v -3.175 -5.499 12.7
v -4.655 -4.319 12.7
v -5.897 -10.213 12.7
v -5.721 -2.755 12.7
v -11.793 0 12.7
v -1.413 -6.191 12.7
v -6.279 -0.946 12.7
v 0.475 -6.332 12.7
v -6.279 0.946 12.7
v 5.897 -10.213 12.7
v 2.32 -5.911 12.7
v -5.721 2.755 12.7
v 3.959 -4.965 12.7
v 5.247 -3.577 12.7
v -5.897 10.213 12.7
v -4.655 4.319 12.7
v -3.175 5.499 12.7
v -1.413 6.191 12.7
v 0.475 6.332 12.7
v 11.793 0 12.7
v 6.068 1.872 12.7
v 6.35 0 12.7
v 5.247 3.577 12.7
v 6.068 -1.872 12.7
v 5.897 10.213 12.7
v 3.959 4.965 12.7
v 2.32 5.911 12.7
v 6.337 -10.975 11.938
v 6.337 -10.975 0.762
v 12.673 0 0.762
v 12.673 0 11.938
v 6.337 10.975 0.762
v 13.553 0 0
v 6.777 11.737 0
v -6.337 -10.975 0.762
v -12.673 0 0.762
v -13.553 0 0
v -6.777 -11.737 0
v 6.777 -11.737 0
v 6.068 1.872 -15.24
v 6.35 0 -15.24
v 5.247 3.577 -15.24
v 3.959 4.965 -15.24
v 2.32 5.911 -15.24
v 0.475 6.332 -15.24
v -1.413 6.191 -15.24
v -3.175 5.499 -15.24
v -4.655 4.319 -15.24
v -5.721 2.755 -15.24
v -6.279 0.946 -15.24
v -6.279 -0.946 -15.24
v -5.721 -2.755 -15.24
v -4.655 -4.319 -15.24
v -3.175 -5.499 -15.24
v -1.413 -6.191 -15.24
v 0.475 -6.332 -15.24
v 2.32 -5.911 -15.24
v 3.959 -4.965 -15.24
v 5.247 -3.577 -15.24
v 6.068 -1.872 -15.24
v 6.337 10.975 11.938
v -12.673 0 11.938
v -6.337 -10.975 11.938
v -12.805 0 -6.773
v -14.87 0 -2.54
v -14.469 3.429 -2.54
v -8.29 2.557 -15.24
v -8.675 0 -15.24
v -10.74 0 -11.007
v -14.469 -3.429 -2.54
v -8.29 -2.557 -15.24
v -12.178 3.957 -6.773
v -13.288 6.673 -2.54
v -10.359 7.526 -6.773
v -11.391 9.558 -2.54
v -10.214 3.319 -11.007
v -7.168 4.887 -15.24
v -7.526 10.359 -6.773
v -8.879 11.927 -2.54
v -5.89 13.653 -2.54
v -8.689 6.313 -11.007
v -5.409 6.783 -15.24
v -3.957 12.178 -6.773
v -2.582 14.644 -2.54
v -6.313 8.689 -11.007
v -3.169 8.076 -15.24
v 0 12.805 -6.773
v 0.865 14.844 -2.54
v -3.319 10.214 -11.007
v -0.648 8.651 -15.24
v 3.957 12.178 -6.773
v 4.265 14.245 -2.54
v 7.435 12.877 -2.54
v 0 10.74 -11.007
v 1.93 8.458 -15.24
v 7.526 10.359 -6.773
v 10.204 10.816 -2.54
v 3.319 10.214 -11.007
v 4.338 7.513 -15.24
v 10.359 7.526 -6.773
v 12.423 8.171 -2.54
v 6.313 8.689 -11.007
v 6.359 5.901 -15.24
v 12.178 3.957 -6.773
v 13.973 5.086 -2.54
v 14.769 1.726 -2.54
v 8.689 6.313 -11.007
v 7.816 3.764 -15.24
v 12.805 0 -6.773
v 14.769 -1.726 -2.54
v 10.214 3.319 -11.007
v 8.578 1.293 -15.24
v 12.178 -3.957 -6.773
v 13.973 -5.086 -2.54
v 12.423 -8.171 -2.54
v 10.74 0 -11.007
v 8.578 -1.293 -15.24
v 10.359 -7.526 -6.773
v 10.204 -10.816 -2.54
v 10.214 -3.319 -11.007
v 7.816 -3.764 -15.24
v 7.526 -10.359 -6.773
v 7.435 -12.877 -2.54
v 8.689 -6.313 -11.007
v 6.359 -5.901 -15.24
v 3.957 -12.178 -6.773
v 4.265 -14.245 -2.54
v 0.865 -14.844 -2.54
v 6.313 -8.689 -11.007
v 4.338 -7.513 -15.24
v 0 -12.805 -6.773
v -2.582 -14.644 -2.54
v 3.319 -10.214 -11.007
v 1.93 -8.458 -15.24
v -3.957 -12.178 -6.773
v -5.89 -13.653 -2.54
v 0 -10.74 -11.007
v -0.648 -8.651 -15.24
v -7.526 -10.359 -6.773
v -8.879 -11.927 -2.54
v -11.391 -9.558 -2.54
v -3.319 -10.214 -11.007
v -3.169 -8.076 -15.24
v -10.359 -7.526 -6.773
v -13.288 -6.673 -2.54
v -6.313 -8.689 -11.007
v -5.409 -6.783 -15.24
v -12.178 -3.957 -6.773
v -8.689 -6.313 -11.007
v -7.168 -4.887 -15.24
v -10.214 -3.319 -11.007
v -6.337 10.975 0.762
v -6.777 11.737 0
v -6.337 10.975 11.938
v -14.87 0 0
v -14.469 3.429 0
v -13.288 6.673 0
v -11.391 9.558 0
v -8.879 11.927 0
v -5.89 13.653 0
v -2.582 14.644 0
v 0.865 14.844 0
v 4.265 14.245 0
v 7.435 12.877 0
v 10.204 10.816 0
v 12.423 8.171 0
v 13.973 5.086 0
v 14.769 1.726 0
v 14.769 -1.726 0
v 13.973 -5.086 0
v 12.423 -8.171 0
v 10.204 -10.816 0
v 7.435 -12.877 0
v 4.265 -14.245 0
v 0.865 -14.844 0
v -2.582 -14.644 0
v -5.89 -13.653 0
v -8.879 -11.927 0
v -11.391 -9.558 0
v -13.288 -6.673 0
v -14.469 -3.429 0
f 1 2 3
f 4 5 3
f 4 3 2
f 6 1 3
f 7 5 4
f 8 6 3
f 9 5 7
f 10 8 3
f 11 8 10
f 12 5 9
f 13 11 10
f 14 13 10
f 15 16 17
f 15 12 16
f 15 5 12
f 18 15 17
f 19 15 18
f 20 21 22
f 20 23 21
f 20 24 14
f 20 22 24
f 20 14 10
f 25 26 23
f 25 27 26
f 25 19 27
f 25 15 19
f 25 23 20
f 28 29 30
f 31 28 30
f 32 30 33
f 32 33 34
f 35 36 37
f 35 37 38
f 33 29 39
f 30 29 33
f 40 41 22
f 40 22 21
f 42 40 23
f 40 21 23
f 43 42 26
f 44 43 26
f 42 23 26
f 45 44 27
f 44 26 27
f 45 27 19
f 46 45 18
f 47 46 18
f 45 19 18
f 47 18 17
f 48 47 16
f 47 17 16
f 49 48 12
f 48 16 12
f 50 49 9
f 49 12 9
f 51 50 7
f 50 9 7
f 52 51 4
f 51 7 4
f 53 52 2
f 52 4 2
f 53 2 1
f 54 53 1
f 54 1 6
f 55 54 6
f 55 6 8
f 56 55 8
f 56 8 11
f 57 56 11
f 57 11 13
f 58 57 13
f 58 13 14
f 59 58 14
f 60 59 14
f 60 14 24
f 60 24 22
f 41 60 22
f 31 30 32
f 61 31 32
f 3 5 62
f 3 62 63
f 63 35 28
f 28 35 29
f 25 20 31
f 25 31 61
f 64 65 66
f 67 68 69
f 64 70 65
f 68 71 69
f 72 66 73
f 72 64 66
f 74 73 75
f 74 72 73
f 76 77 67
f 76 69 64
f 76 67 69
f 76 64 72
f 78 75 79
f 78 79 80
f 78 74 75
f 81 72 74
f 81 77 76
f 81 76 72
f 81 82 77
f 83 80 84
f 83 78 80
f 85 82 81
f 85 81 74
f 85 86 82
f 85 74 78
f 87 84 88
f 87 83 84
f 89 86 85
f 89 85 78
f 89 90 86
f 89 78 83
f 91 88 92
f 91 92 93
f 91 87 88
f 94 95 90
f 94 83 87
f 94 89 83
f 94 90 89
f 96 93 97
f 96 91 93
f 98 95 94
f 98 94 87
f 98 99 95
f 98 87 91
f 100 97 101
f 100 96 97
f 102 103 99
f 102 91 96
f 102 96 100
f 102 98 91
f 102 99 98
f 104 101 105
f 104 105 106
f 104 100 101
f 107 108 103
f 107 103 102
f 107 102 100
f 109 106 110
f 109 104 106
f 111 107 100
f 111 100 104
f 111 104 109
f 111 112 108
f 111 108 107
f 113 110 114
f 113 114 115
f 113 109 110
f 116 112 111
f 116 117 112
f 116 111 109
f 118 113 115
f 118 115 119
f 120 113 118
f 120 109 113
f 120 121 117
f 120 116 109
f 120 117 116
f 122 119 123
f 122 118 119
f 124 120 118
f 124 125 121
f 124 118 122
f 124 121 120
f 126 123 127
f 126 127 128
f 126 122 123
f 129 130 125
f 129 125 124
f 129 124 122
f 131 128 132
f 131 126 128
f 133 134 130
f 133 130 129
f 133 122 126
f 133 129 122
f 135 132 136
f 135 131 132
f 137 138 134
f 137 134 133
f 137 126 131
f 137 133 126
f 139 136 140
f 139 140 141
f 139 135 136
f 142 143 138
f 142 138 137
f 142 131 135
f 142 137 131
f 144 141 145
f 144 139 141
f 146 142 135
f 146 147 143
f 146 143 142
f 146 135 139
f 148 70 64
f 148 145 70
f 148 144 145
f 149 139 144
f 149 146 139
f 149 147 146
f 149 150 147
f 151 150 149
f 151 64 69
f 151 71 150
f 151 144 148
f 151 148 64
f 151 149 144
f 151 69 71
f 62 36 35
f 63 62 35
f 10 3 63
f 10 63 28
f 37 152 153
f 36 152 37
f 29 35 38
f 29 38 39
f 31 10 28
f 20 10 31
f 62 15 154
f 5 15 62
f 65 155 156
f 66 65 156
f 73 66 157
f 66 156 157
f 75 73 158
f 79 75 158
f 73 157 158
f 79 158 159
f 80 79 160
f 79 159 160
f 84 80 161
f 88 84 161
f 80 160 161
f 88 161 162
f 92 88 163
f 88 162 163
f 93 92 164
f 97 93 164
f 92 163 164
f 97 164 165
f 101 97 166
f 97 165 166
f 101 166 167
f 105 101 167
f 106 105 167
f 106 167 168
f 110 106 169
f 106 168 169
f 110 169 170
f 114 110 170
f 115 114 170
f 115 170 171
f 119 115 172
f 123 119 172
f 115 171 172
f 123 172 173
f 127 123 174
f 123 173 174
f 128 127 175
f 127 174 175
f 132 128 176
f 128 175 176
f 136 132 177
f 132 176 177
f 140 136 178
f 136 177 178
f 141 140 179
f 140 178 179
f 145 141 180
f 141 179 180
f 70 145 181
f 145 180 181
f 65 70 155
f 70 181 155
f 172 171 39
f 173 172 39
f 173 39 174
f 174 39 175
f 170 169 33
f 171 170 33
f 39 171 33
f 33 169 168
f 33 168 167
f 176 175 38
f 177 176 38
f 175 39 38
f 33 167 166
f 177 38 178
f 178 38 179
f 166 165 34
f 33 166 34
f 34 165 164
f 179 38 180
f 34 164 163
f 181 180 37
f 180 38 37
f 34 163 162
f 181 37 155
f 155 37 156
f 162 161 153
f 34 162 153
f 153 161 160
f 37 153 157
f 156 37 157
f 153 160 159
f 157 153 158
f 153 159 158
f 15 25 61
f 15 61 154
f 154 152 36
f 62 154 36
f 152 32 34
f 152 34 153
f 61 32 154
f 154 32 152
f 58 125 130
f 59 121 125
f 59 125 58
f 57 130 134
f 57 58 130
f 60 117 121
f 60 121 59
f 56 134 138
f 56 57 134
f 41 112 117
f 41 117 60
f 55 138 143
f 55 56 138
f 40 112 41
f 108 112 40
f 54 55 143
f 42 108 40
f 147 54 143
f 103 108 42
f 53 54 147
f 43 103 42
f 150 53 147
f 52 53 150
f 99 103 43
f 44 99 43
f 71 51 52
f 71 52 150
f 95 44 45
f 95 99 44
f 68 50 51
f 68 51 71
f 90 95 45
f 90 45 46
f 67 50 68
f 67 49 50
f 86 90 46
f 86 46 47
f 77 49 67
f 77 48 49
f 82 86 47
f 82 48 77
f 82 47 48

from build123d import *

# Parameters (mm, degrees)
EXTRUDE1_DEPTH     = 12.7
SKETCH3_R          = 14.869502809
EXTRUDE2_DEPTH     = 2.54
CHAMFER1_SIZE      = 0.762
CHAMFER2_SIZE      = 0.762
SKETCH5_R          = 14.869502809
EXTRUDE3_DEPTH     = 12.7
EXTRUDE3_TAPER     = 26
SKETCH4_R          = 6.35
CUT_EXTRUDE1_DEPTH = 28.9400001


with BuildPart() as part:
    # Sketch2 → Extrude1 (new body)
    with BuildSketch(Plane.XY):
        Polygon((12.673375262, 0), (6.336687631, 10.975464929), (-6.336687631, 10.975464929), (-12.673375262, 0), (-6.336687631, -10.975464929), (6.336687631, -10.975464929), align=None)
    extrude(amount=EXTRUDE1_DEPTH)

    # Sketch3 → Extrude2 (add)
    with BuildSketch(Plane(origin=(0, 0, 0), x_dir=(-1, 0, 0), z_dir=(0, 0, -1))):
        Circle(SKETCH3_R)
    extrude(amount=EXTRUDE2_DEPTH)

    # Chamfer1
    chamfer1_edges = [part.edges().sort_by_distance(p)[0] for p in [
        (0, -10.975464929, 0),
        (-9.505031447, -5.487732464, 0),
        (-9.505031447, 5.487732464, 0),
        (0, 10.975464929, 0),
        (9.505031447, 5.487732464, 0),
        (9.505031447, -5.487732464, 0),
    ]]
    chamfer(chamfer1_edges, length=CHAMFER1_SIZE)

    # Chamfer2
    chamfer2_edges = [part.edges().sort_by_distance(p)[0] for p in [
        (0, 10.975464929, 12.7),
        (-9.505031447, 5.487732464, 12.7),
        (-9.505031447, -5.487732464, 12.7),
        (0, -10.975464929, 12.7),
        (9.505031447, -5.487732464, 12.7),
        (9.505031447, 5.487732464, 12.7),
    ]]
    chamfer(chamfer2_edges, length=CHAMFER2_SIZE)

    # Sketch5 → Extrude3 (add)
    with BuildSketch(Plane(origin=(0, 0, -2.54), x_dir=(-1, 0, 0), z_dir=(0, 0, -1))):
        Circle(SKETCH5_R)
    extrude(amount=EXTRUDE3_DEPTH, taper=EXTRUDE3_TAPER)

    # Sketch4 → Cut-Extrude1 (cut, through all)
    with BuildSketch(Plane.XY.offset(12.7)):
        Circle(SKETCH4_R)
    extrude(amount=-CUT_EXTRUDE1_DEPTH, mode=Mode.SUBTRACT)


solid = part.part
